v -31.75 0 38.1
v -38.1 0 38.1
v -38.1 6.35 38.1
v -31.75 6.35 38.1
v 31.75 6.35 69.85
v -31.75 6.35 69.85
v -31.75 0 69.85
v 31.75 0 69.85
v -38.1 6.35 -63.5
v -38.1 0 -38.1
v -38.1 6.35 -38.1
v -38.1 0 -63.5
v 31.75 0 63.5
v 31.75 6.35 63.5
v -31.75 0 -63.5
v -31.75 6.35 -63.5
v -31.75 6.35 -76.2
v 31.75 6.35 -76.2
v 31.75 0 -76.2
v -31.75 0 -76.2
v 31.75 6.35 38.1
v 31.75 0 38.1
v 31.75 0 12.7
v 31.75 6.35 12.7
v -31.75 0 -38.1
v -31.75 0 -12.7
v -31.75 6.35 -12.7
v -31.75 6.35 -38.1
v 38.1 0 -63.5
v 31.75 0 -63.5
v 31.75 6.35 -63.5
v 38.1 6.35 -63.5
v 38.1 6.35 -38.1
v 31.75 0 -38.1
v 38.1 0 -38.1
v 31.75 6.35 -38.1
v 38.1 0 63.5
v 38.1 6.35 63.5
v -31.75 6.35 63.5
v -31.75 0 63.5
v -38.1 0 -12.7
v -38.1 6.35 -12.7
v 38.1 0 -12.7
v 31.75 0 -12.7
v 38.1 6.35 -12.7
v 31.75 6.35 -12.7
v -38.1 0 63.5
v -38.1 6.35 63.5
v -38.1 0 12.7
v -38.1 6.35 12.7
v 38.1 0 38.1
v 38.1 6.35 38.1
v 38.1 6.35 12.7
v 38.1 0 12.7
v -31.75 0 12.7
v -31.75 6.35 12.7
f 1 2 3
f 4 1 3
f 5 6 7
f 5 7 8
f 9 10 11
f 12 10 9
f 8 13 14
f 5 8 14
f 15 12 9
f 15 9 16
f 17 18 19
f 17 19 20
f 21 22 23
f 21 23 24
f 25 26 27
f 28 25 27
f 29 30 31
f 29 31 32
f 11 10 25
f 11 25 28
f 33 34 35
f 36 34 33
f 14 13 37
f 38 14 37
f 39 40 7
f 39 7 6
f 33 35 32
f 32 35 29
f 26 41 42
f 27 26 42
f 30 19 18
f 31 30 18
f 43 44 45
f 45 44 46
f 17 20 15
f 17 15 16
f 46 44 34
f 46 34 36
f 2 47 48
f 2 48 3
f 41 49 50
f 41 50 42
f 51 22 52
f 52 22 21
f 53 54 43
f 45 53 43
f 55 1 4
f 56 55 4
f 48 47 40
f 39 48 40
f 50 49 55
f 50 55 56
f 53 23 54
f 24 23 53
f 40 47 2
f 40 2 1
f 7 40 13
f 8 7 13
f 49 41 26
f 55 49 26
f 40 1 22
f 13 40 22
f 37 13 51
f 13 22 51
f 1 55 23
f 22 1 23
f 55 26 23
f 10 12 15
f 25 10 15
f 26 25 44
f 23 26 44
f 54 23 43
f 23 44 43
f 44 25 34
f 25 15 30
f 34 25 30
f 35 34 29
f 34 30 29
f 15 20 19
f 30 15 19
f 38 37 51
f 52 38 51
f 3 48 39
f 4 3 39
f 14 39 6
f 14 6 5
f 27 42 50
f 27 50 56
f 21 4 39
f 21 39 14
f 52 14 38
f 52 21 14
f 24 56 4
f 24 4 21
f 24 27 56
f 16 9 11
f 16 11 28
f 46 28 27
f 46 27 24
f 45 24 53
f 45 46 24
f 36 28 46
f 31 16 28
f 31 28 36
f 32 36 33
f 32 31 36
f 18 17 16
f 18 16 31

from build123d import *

# Parameters (mm, degrees)
SKETCH1_W           = 76.2
SKETCH1_H           = 127
BOSS_EXTRUDE1_DEPTH = 6.35
CAVITY1_START       = -38.1
CAVITY1_OUTLINE_W   = 6.35
CAVITY1_OUTLINE_H   = 25.4
CAVITY1_DEPTH       = 6.35
CAVITY1_START_2     = 31.75
CAVITY1_2_OUTLINE_W = 6.35
CAVITY1_2_OUTLINE_H = 25.4
CAVITY1_2_DEPTH     = 6.35
SKETCH2_W           = 63.5
SKETCH2_H           = 6.35
BOSS_EXTRUDE2_DEPTH = 6.35
SKETCH3_W           = 63.5
SKETCH3_H           = 6.35
BOSS_EXTRUDE3_DEPTH = 12.7


# Read off the part's stored shape, not the designer's step: Cavity1
with BuildPart() as part:
    # Sketch1 → Boss-Extrude1 (new body)
    with BuildSketch(Plane(origin=(0, 0, 0), x_dir=(1, 0, 0), z_dir=(0, 1, 0))):
        Rectangle(SKETCH1_W, SKETCH1_H)
    extrude(amount=BOSS_EXTRUDE1_DEPTH)

    # Cavity1 outline → Cavity1 (cut)
    with BuildSketch(Plane.YZ.offset(CAVITY1_START)):
        with Locations((3.175, 25.4)):
            Rectangle(CAVITY1_OUTLINE_W, CAVITY1_OUTLINE_H)
        with Locations((3.175, -25.4)):
            Rectangle(CAVITY1_OUTLINE_W, CAVITY1_OUTLINE_H)
    extrude(amount=CAVITY1_DEPTH, mode=Mode.SUBTRACT)

    # Cavity1 2 outline → Cavity1 2 (cut)
    with BuildSketch(Plane.YZ.offset(CAVITY1_START_2)):
        with Locations((3.175, 25.4)):
            Rectangle(CAVITY1_2_OUTLINE_W, CAVITY1_2_OUTLINE_H)
        with Locations((3.175, -25.4)):
            Rectangle(CAVITY1_2_OUTLINE_W, CAVITY1_2_OUTLINE_H)
    extrude(amount=CAVITY1_2_DEPTH, mode=Mode.SUBTRACT)

    # Sketch2 → Boss-Extrude2 (add)
    with BuildSketch(Plane.XY.offset(63.5)):
        with Locations((0, 3.175)):
            Rectangle(SKETCH2_W, SKETCH2_H)
    extrude(amount=BOSS_EXTRUDE2_DEPTH)

    # Sketch3 → Boss-Extrude3 (add)
    with BuildSketch(Plane(origin=(0, 0, -63.5), x_dir=(-1, 0, 0), z_dir=(0, 0, -1))):
        with Locations((0, 3.175)):
            Rectangle(SKETCH3_W, SKETCH3_H)
    extrude(amount=BOSS_EXTRUDE3_DEPTH)


solid = part.part
